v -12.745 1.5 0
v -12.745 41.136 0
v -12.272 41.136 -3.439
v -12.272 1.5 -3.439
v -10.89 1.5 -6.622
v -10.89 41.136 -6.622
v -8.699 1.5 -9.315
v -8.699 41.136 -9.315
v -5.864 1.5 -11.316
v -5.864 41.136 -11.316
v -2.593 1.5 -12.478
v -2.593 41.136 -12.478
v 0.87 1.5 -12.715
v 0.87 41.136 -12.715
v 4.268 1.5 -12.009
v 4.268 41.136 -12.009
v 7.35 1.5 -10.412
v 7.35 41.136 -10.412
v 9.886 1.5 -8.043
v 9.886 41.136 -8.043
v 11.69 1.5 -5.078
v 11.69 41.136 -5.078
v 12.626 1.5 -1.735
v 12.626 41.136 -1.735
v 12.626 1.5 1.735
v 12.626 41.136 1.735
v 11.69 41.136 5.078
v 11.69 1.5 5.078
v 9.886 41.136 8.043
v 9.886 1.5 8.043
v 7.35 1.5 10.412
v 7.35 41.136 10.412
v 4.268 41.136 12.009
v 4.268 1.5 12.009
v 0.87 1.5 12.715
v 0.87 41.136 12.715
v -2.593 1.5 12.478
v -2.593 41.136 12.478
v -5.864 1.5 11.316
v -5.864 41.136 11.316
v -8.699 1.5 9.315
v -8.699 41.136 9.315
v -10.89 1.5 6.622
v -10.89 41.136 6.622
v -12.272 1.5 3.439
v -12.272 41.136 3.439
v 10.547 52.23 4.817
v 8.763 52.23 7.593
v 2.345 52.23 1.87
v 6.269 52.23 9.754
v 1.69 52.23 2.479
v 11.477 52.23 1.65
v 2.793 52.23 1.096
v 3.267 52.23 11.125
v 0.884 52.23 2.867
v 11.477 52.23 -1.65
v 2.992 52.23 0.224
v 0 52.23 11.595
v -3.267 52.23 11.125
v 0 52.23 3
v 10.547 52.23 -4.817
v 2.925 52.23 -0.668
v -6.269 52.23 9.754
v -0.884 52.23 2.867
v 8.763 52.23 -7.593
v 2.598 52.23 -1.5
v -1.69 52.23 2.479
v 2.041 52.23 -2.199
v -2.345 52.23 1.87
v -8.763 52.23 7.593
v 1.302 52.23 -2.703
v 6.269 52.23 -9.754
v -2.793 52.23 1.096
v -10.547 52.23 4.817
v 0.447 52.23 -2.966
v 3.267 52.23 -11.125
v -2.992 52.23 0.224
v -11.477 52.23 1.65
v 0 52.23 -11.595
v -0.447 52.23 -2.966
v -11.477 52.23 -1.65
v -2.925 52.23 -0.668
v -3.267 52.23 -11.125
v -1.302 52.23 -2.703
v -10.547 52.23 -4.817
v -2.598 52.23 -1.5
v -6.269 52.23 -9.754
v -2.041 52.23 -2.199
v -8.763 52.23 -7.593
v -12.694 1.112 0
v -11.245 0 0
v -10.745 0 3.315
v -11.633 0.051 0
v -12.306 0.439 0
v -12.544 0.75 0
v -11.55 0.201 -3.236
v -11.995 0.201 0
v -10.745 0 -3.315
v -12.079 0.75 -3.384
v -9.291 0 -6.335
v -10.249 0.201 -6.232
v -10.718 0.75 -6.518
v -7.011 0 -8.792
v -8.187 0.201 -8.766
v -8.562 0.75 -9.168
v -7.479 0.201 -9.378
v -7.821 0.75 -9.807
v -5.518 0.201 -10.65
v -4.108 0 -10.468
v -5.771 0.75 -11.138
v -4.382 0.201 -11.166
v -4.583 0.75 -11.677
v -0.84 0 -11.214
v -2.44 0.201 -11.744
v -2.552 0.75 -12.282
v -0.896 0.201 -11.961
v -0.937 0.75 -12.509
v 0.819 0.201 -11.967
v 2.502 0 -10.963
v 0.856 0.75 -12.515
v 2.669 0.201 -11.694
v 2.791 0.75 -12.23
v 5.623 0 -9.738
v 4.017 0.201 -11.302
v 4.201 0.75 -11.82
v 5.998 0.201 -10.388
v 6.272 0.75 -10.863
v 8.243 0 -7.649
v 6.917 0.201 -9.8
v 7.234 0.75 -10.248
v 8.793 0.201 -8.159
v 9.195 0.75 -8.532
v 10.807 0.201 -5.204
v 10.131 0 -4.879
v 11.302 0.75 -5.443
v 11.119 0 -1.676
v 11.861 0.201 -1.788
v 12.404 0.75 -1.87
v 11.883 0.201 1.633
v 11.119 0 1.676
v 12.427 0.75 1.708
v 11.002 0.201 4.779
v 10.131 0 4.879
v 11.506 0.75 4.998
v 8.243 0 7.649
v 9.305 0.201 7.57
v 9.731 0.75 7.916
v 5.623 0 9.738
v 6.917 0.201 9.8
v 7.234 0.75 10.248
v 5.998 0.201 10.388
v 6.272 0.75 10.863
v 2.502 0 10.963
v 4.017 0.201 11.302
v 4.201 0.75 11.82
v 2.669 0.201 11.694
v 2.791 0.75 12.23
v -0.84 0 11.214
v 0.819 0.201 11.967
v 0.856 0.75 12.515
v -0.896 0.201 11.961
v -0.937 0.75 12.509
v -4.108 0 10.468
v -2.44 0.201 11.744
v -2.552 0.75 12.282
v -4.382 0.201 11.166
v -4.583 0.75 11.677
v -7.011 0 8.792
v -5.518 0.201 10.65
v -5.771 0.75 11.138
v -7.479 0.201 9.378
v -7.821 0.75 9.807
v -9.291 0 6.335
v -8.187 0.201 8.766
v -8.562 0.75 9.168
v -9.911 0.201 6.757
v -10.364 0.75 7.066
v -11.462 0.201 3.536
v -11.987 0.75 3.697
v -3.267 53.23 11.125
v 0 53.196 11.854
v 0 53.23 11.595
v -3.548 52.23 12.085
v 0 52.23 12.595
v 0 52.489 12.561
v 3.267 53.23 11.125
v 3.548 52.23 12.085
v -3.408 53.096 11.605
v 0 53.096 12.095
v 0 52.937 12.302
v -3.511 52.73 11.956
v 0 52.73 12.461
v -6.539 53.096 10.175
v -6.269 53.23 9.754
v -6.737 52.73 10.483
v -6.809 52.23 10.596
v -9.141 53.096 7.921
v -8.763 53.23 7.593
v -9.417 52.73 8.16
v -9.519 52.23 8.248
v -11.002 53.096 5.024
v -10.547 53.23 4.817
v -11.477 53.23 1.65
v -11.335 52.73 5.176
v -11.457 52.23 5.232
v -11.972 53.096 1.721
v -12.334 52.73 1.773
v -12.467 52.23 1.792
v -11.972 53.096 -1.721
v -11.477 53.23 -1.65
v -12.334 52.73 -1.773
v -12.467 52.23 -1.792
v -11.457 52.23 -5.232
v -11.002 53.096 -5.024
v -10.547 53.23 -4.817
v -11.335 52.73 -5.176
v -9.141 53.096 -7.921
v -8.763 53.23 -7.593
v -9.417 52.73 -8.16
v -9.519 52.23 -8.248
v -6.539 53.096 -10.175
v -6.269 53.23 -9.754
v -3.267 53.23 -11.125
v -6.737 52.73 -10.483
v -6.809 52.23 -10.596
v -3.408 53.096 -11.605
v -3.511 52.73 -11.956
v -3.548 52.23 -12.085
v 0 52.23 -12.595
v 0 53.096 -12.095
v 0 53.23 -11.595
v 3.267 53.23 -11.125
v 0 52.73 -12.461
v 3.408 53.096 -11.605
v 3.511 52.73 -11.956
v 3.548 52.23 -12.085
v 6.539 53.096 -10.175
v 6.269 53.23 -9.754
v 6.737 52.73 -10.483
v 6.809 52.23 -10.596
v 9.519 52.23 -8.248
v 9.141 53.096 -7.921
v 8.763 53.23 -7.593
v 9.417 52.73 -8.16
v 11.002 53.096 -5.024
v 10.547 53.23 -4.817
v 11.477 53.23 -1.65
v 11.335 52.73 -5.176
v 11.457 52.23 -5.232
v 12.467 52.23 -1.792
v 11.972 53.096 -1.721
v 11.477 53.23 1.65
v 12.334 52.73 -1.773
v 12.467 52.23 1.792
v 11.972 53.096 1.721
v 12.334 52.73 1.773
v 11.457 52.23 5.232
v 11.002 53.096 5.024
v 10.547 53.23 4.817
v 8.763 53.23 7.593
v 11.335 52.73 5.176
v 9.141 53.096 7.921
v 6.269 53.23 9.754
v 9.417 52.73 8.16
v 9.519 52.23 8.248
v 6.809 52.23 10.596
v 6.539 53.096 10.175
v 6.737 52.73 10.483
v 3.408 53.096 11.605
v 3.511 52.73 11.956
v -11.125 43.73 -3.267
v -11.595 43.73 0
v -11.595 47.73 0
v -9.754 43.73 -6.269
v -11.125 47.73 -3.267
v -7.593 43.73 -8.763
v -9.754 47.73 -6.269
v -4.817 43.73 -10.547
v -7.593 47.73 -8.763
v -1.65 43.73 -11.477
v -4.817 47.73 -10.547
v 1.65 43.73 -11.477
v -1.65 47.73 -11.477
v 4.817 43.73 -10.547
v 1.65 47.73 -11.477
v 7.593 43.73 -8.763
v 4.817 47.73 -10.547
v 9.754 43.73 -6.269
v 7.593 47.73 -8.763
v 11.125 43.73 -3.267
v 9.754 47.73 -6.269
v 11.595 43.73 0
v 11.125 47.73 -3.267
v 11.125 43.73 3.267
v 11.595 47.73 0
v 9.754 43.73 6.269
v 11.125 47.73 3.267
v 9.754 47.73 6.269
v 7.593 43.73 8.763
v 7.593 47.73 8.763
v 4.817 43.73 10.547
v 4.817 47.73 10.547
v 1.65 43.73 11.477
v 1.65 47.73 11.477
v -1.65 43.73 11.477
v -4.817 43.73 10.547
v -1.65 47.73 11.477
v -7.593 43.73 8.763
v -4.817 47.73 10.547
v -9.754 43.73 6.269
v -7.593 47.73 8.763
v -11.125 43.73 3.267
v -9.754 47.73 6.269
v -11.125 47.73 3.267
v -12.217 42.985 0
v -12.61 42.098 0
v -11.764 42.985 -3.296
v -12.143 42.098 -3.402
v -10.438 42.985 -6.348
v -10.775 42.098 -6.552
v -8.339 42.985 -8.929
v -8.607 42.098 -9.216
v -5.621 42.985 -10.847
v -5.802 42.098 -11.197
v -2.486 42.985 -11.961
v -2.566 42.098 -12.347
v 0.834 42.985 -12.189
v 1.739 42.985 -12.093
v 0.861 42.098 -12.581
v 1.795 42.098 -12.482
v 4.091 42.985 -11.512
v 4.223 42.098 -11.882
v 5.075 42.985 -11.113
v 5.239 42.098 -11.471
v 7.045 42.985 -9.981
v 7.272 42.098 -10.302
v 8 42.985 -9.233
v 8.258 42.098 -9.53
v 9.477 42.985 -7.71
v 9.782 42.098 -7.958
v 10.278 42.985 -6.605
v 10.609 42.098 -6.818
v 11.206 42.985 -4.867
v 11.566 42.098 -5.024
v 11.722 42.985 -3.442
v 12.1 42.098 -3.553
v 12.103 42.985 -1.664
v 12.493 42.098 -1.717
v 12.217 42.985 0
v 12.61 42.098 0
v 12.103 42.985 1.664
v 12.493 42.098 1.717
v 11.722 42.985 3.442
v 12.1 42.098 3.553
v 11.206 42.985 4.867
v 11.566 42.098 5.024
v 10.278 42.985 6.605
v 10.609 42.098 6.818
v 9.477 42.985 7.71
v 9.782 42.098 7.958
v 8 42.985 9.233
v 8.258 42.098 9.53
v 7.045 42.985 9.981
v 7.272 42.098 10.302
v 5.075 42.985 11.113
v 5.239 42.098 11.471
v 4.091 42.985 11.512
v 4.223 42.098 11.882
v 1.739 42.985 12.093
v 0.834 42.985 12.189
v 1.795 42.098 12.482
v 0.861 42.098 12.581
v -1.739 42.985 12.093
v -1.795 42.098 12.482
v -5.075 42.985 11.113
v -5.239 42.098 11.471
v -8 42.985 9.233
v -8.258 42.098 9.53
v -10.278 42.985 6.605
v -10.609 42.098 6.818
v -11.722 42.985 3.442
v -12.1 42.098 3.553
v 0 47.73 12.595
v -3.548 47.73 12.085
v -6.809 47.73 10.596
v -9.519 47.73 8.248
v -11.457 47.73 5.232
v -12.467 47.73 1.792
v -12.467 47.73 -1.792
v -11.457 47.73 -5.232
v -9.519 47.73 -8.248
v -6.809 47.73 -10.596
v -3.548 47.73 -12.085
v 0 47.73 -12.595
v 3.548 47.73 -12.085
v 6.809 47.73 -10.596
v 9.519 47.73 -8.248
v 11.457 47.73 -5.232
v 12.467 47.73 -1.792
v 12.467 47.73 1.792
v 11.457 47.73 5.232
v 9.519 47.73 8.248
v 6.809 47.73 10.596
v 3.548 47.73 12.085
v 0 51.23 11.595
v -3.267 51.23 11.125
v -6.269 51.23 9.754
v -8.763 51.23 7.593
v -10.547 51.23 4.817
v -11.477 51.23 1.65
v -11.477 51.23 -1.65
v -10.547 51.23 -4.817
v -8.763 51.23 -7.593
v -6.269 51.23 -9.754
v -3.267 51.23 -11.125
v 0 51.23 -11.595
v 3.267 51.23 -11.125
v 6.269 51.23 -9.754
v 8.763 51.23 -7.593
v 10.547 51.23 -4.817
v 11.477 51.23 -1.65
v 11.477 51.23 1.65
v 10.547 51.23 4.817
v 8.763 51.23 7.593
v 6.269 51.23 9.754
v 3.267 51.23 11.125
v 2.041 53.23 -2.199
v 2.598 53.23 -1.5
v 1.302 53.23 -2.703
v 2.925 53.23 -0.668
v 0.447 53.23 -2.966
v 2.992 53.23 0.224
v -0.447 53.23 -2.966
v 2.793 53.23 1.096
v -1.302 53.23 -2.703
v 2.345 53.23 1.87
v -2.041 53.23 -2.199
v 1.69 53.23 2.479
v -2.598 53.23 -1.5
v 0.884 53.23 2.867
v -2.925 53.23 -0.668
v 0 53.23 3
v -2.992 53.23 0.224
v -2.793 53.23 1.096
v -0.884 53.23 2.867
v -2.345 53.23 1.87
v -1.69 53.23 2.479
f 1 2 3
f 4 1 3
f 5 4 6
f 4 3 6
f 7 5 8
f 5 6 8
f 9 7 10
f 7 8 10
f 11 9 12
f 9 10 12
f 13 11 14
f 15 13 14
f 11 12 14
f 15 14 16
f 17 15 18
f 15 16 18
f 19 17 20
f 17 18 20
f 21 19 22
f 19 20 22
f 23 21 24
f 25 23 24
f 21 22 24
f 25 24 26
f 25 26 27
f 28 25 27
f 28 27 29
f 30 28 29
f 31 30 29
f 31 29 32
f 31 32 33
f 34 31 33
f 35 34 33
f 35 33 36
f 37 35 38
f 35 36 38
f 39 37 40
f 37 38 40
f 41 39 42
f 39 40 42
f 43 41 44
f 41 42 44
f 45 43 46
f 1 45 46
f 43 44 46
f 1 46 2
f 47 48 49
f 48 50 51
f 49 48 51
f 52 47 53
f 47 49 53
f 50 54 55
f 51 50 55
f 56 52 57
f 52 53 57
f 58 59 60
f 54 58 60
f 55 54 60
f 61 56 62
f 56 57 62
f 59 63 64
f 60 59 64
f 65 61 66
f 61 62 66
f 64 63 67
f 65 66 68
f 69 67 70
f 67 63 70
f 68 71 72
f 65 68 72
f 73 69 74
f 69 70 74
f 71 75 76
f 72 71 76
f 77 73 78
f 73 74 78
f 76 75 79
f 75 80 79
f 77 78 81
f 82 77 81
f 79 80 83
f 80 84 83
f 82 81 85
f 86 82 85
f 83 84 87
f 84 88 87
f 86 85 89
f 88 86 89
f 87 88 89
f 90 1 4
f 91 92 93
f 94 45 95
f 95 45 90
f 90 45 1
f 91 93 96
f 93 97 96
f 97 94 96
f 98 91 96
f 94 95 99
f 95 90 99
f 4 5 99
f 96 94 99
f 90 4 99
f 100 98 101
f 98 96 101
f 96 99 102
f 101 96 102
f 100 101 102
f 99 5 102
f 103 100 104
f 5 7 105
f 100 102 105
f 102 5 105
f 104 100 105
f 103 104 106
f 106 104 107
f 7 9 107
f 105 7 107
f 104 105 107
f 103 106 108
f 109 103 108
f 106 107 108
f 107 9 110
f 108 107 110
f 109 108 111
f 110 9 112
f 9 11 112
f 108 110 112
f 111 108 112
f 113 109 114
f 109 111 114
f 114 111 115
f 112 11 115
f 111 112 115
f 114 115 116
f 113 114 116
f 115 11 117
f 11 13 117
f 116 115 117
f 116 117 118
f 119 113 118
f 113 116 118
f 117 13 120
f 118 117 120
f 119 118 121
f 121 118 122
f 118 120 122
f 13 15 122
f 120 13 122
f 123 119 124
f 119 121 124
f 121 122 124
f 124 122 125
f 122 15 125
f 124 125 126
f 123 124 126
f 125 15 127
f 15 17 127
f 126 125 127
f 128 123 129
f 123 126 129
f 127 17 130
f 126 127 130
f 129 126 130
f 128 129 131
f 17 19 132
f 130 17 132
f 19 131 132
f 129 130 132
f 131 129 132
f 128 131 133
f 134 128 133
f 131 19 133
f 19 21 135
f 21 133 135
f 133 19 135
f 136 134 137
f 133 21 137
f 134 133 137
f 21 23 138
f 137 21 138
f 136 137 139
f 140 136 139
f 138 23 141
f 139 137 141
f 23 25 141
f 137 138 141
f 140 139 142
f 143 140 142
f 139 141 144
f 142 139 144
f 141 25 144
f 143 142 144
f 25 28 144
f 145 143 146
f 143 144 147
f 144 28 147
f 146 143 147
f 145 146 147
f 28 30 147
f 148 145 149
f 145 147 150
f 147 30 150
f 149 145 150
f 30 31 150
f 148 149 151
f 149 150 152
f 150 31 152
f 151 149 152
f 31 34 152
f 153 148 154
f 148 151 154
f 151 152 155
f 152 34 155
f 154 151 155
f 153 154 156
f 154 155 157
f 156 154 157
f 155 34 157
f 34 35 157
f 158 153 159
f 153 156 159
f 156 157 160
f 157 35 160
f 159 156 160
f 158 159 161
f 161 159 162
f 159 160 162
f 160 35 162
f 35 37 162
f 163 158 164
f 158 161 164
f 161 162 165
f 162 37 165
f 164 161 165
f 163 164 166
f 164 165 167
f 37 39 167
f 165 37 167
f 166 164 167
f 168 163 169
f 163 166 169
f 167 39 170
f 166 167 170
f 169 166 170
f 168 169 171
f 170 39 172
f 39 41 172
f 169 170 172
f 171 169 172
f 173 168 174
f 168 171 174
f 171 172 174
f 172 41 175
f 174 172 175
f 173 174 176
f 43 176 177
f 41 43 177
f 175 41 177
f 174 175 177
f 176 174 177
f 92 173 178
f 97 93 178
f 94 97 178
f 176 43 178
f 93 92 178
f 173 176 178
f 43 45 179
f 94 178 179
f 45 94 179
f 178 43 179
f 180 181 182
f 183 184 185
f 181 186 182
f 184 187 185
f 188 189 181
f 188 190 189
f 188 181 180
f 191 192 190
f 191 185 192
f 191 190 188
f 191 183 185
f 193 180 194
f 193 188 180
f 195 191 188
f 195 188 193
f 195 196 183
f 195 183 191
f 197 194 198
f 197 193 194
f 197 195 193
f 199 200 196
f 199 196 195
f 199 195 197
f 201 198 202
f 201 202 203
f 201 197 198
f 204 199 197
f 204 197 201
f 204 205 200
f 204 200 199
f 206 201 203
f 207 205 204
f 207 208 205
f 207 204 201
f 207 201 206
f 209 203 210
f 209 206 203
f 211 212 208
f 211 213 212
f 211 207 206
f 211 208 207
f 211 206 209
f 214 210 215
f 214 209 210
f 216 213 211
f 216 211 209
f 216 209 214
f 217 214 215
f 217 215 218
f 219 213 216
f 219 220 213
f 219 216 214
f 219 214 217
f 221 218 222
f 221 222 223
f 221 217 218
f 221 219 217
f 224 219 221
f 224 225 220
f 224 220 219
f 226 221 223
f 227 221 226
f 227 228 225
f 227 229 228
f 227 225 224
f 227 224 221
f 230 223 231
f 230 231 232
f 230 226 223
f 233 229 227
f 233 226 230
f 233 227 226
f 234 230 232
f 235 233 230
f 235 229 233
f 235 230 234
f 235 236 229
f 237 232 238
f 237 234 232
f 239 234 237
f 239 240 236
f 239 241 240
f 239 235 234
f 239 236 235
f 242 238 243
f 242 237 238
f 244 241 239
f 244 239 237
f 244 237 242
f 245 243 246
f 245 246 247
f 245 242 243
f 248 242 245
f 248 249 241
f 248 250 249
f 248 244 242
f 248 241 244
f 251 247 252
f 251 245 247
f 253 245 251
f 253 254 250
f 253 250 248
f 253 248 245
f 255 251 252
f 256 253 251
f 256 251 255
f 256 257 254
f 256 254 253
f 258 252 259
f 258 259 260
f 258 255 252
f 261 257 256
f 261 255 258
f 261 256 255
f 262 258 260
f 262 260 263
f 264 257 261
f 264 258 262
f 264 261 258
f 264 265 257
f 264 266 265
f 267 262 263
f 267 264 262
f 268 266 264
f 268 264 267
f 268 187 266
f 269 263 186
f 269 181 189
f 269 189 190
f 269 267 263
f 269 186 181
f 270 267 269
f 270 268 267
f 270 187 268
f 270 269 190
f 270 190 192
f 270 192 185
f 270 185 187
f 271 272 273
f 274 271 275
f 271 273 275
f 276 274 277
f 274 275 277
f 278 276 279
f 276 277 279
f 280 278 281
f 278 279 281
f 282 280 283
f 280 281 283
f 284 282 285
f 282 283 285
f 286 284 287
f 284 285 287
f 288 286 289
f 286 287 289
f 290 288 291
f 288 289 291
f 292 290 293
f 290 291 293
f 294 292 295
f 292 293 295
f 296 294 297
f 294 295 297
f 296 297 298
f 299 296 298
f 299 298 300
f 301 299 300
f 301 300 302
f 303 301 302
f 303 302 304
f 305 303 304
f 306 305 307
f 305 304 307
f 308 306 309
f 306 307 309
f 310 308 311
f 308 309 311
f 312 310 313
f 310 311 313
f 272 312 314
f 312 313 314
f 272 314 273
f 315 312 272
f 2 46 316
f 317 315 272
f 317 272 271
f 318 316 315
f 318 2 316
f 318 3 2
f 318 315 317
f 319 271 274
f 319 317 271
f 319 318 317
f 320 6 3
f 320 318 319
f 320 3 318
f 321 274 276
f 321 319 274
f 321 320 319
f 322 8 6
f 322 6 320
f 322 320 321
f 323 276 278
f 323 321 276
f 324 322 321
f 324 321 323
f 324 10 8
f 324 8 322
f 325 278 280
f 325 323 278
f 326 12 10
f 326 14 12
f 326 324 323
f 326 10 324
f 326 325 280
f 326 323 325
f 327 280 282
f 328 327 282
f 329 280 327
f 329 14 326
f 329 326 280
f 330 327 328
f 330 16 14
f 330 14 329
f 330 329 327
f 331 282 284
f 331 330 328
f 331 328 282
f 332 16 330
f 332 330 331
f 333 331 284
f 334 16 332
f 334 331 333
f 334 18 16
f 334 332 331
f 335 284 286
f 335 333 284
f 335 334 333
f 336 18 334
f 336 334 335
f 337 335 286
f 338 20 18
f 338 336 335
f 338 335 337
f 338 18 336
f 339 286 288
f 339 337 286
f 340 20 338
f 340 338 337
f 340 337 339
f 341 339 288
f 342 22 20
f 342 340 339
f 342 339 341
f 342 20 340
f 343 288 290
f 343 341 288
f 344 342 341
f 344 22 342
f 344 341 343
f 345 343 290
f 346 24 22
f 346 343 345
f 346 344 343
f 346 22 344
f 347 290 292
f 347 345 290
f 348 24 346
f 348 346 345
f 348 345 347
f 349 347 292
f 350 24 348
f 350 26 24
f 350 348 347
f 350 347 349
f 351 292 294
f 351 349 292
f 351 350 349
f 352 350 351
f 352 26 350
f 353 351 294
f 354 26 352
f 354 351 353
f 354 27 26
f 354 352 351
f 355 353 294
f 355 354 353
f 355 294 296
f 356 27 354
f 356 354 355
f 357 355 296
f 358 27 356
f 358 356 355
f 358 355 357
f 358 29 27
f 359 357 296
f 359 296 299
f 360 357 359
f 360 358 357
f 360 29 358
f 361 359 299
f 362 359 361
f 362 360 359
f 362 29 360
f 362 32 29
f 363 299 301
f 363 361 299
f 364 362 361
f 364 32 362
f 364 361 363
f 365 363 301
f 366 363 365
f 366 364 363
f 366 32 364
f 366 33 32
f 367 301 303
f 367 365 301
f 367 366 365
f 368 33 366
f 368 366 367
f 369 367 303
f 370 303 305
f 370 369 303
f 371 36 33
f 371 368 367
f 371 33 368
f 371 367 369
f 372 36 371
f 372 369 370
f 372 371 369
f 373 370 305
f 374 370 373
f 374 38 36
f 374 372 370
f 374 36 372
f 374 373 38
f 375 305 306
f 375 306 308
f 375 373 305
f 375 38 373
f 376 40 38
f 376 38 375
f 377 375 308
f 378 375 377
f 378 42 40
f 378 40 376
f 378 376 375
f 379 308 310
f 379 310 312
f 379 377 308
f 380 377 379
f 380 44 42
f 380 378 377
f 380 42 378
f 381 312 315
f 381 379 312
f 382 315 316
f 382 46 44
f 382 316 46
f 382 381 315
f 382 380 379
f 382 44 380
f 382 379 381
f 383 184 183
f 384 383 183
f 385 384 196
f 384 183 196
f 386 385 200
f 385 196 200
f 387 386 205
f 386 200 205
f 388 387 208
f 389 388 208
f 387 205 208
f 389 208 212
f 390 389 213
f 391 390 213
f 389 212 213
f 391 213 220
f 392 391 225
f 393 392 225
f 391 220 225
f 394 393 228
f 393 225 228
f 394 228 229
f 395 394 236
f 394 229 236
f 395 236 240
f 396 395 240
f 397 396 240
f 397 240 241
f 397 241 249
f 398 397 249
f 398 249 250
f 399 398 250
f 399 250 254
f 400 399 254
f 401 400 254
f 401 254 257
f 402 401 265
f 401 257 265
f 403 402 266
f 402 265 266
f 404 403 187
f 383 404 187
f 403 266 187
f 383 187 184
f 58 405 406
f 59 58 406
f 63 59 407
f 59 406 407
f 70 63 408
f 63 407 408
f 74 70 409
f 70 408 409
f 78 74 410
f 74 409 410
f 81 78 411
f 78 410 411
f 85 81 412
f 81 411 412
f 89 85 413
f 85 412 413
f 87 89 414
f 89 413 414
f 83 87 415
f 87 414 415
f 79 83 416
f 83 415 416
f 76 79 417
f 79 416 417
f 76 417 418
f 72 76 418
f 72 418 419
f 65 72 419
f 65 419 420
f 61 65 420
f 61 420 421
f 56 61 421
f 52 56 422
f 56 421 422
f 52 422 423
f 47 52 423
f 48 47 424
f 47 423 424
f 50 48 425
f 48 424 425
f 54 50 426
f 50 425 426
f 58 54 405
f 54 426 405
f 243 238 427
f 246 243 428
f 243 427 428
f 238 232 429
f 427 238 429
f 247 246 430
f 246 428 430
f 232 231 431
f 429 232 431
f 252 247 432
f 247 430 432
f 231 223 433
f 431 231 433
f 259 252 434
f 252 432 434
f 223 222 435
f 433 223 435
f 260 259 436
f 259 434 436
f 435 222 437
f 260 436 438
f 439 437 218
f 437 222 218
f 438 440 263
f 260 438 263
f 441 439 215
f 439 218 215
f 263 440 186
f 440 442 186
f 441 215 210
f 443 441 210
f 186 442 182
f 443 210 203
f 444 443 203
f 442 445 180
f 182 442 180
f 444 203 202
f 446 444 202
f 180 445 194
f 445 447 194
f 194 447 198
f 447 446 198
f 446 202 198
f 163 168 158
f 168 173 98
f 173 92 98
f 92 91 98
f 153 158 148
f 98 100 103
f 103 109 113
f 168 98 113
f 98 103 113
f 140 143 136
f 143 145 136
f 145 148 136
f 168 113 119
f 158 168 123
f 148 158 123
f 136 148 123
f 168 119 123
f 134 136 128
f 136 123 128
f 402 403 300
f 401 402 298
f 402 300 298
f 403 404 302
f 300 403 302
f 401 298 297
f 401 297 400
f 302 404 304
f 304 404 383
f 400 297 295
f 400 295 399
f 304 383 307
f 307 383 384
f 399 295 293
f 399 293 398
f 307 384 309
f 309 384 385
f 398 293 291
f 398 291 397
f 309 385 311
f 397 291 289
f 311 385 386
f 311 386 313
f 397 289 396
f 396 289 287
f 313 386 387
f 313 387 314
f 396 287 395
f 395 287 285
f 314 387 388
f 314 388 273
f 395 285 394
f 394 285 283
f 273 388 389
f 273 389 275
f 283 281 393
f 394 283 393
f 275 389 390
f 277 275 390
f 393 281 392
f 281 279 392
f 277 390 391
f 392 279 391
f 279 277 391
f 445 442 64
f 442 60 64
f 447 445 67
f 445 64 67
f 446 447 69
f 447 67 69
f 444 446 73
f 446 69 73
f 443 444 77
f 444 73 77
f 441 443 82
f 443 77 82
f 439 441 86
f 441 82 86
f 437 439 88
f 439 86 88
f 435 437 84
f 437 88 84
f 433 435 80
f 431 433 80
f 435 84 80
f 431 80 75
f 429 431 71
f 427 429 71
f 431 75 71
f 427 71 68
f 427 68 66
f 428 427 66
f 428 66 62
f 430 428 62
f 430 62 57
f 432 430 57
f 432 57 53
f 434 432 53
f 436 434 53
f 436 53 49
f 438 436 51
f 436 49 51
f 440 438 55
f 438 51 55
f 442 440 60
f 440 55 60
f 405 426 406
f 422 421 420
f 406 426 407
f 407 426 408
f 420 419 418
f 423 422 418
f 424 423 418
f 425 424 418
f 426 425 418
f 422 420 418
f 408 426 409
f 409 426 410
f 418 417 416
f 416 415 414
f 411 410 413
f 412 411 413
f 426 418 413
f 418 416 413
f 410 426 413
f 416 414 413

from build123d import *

# Parameters (mm, degrees)
FILLET1_R = 3.5
FILLET2_R = 1.5
FILLET3_R = 1


with BuildPart() as part:
    # Sketch1 → Revolve1 (revolve)
    with BuildSketch(Plane.XY):
        Polygon((0, 0), (-12.745, 0), (-12.745, 43.73), (-11.595, 43.73), (-11.595, 51.23), (0, 51.23), align=None)
    revolve(axis=Axis((0, 51.23, 0), (0, -1, 0)))

    # Fillet1
    # the kernel refuses this fillet: 3.5 mm, written as the material it takes off along each edge
    with BuildSketch(Plane(origin=(0, 43.73, 0), x_dir=(-1, 0, 0), z_dir=(0, 0, 1))) as fillet1_piece_1:
        with BuildLine():
            CenterArc((9.245, 2.59374247), FILLET1_R, 312.177418601, 47.822581399)
            Line((11.595, 0), (11.642, -0.051874849))
            ThreePointArc((11.642, -0.051874849), (12.17, -0.07), (12.745, -0.07))
            Line((12.745, -0.07), (12.815, 0))
            Line((12.815, 0), (12.815, 2.59374247))
            Line((12.815, 2.59374247), (12.745, 2.59374247))
        make_face()
    revolve(axis=Axis((0, 43.73, 0), (0, -1, 0)), mode=Mode.SUBTRACT)

    # Fillet2
    fillet2_edges = [part.edges().sort_by_distance(p)[0] for p in [
        (12.745, 0, 0),
    ]]
    fillet(fillet2_edges, radius=FILLET2_R)

    # Sketch2 → Revolve2 (revolve)
    with BuildSketch(Plane(origin=(0, 0, 0), x_dir=(0, 0, -1), z_dir=(1, 0, 0)), mode=Mode.PRIVATE) as revolve2_sk:
        Polygon((3, 52.23), (11.595, 52.23), (11.595, 47.73), (12.595, 47.73), (12.595, 53.23), (3, 53.23), align=None)
    revolve(revolve2_sk.sketch.rotate(Axis((0, 51.23, 0), (0, -1, 0)), 180), axis=Axis((0, 51.23, 0), (0, -1, 0)))

    # Fillet3
    fillet3_edges = [part.edges().sort_by_distance(p)[0] for p in [
        (0, 53.23, -12.595),
    ]]
    fillet(fillet3_edges, radius=FILLET3_R)


solid = part.part
